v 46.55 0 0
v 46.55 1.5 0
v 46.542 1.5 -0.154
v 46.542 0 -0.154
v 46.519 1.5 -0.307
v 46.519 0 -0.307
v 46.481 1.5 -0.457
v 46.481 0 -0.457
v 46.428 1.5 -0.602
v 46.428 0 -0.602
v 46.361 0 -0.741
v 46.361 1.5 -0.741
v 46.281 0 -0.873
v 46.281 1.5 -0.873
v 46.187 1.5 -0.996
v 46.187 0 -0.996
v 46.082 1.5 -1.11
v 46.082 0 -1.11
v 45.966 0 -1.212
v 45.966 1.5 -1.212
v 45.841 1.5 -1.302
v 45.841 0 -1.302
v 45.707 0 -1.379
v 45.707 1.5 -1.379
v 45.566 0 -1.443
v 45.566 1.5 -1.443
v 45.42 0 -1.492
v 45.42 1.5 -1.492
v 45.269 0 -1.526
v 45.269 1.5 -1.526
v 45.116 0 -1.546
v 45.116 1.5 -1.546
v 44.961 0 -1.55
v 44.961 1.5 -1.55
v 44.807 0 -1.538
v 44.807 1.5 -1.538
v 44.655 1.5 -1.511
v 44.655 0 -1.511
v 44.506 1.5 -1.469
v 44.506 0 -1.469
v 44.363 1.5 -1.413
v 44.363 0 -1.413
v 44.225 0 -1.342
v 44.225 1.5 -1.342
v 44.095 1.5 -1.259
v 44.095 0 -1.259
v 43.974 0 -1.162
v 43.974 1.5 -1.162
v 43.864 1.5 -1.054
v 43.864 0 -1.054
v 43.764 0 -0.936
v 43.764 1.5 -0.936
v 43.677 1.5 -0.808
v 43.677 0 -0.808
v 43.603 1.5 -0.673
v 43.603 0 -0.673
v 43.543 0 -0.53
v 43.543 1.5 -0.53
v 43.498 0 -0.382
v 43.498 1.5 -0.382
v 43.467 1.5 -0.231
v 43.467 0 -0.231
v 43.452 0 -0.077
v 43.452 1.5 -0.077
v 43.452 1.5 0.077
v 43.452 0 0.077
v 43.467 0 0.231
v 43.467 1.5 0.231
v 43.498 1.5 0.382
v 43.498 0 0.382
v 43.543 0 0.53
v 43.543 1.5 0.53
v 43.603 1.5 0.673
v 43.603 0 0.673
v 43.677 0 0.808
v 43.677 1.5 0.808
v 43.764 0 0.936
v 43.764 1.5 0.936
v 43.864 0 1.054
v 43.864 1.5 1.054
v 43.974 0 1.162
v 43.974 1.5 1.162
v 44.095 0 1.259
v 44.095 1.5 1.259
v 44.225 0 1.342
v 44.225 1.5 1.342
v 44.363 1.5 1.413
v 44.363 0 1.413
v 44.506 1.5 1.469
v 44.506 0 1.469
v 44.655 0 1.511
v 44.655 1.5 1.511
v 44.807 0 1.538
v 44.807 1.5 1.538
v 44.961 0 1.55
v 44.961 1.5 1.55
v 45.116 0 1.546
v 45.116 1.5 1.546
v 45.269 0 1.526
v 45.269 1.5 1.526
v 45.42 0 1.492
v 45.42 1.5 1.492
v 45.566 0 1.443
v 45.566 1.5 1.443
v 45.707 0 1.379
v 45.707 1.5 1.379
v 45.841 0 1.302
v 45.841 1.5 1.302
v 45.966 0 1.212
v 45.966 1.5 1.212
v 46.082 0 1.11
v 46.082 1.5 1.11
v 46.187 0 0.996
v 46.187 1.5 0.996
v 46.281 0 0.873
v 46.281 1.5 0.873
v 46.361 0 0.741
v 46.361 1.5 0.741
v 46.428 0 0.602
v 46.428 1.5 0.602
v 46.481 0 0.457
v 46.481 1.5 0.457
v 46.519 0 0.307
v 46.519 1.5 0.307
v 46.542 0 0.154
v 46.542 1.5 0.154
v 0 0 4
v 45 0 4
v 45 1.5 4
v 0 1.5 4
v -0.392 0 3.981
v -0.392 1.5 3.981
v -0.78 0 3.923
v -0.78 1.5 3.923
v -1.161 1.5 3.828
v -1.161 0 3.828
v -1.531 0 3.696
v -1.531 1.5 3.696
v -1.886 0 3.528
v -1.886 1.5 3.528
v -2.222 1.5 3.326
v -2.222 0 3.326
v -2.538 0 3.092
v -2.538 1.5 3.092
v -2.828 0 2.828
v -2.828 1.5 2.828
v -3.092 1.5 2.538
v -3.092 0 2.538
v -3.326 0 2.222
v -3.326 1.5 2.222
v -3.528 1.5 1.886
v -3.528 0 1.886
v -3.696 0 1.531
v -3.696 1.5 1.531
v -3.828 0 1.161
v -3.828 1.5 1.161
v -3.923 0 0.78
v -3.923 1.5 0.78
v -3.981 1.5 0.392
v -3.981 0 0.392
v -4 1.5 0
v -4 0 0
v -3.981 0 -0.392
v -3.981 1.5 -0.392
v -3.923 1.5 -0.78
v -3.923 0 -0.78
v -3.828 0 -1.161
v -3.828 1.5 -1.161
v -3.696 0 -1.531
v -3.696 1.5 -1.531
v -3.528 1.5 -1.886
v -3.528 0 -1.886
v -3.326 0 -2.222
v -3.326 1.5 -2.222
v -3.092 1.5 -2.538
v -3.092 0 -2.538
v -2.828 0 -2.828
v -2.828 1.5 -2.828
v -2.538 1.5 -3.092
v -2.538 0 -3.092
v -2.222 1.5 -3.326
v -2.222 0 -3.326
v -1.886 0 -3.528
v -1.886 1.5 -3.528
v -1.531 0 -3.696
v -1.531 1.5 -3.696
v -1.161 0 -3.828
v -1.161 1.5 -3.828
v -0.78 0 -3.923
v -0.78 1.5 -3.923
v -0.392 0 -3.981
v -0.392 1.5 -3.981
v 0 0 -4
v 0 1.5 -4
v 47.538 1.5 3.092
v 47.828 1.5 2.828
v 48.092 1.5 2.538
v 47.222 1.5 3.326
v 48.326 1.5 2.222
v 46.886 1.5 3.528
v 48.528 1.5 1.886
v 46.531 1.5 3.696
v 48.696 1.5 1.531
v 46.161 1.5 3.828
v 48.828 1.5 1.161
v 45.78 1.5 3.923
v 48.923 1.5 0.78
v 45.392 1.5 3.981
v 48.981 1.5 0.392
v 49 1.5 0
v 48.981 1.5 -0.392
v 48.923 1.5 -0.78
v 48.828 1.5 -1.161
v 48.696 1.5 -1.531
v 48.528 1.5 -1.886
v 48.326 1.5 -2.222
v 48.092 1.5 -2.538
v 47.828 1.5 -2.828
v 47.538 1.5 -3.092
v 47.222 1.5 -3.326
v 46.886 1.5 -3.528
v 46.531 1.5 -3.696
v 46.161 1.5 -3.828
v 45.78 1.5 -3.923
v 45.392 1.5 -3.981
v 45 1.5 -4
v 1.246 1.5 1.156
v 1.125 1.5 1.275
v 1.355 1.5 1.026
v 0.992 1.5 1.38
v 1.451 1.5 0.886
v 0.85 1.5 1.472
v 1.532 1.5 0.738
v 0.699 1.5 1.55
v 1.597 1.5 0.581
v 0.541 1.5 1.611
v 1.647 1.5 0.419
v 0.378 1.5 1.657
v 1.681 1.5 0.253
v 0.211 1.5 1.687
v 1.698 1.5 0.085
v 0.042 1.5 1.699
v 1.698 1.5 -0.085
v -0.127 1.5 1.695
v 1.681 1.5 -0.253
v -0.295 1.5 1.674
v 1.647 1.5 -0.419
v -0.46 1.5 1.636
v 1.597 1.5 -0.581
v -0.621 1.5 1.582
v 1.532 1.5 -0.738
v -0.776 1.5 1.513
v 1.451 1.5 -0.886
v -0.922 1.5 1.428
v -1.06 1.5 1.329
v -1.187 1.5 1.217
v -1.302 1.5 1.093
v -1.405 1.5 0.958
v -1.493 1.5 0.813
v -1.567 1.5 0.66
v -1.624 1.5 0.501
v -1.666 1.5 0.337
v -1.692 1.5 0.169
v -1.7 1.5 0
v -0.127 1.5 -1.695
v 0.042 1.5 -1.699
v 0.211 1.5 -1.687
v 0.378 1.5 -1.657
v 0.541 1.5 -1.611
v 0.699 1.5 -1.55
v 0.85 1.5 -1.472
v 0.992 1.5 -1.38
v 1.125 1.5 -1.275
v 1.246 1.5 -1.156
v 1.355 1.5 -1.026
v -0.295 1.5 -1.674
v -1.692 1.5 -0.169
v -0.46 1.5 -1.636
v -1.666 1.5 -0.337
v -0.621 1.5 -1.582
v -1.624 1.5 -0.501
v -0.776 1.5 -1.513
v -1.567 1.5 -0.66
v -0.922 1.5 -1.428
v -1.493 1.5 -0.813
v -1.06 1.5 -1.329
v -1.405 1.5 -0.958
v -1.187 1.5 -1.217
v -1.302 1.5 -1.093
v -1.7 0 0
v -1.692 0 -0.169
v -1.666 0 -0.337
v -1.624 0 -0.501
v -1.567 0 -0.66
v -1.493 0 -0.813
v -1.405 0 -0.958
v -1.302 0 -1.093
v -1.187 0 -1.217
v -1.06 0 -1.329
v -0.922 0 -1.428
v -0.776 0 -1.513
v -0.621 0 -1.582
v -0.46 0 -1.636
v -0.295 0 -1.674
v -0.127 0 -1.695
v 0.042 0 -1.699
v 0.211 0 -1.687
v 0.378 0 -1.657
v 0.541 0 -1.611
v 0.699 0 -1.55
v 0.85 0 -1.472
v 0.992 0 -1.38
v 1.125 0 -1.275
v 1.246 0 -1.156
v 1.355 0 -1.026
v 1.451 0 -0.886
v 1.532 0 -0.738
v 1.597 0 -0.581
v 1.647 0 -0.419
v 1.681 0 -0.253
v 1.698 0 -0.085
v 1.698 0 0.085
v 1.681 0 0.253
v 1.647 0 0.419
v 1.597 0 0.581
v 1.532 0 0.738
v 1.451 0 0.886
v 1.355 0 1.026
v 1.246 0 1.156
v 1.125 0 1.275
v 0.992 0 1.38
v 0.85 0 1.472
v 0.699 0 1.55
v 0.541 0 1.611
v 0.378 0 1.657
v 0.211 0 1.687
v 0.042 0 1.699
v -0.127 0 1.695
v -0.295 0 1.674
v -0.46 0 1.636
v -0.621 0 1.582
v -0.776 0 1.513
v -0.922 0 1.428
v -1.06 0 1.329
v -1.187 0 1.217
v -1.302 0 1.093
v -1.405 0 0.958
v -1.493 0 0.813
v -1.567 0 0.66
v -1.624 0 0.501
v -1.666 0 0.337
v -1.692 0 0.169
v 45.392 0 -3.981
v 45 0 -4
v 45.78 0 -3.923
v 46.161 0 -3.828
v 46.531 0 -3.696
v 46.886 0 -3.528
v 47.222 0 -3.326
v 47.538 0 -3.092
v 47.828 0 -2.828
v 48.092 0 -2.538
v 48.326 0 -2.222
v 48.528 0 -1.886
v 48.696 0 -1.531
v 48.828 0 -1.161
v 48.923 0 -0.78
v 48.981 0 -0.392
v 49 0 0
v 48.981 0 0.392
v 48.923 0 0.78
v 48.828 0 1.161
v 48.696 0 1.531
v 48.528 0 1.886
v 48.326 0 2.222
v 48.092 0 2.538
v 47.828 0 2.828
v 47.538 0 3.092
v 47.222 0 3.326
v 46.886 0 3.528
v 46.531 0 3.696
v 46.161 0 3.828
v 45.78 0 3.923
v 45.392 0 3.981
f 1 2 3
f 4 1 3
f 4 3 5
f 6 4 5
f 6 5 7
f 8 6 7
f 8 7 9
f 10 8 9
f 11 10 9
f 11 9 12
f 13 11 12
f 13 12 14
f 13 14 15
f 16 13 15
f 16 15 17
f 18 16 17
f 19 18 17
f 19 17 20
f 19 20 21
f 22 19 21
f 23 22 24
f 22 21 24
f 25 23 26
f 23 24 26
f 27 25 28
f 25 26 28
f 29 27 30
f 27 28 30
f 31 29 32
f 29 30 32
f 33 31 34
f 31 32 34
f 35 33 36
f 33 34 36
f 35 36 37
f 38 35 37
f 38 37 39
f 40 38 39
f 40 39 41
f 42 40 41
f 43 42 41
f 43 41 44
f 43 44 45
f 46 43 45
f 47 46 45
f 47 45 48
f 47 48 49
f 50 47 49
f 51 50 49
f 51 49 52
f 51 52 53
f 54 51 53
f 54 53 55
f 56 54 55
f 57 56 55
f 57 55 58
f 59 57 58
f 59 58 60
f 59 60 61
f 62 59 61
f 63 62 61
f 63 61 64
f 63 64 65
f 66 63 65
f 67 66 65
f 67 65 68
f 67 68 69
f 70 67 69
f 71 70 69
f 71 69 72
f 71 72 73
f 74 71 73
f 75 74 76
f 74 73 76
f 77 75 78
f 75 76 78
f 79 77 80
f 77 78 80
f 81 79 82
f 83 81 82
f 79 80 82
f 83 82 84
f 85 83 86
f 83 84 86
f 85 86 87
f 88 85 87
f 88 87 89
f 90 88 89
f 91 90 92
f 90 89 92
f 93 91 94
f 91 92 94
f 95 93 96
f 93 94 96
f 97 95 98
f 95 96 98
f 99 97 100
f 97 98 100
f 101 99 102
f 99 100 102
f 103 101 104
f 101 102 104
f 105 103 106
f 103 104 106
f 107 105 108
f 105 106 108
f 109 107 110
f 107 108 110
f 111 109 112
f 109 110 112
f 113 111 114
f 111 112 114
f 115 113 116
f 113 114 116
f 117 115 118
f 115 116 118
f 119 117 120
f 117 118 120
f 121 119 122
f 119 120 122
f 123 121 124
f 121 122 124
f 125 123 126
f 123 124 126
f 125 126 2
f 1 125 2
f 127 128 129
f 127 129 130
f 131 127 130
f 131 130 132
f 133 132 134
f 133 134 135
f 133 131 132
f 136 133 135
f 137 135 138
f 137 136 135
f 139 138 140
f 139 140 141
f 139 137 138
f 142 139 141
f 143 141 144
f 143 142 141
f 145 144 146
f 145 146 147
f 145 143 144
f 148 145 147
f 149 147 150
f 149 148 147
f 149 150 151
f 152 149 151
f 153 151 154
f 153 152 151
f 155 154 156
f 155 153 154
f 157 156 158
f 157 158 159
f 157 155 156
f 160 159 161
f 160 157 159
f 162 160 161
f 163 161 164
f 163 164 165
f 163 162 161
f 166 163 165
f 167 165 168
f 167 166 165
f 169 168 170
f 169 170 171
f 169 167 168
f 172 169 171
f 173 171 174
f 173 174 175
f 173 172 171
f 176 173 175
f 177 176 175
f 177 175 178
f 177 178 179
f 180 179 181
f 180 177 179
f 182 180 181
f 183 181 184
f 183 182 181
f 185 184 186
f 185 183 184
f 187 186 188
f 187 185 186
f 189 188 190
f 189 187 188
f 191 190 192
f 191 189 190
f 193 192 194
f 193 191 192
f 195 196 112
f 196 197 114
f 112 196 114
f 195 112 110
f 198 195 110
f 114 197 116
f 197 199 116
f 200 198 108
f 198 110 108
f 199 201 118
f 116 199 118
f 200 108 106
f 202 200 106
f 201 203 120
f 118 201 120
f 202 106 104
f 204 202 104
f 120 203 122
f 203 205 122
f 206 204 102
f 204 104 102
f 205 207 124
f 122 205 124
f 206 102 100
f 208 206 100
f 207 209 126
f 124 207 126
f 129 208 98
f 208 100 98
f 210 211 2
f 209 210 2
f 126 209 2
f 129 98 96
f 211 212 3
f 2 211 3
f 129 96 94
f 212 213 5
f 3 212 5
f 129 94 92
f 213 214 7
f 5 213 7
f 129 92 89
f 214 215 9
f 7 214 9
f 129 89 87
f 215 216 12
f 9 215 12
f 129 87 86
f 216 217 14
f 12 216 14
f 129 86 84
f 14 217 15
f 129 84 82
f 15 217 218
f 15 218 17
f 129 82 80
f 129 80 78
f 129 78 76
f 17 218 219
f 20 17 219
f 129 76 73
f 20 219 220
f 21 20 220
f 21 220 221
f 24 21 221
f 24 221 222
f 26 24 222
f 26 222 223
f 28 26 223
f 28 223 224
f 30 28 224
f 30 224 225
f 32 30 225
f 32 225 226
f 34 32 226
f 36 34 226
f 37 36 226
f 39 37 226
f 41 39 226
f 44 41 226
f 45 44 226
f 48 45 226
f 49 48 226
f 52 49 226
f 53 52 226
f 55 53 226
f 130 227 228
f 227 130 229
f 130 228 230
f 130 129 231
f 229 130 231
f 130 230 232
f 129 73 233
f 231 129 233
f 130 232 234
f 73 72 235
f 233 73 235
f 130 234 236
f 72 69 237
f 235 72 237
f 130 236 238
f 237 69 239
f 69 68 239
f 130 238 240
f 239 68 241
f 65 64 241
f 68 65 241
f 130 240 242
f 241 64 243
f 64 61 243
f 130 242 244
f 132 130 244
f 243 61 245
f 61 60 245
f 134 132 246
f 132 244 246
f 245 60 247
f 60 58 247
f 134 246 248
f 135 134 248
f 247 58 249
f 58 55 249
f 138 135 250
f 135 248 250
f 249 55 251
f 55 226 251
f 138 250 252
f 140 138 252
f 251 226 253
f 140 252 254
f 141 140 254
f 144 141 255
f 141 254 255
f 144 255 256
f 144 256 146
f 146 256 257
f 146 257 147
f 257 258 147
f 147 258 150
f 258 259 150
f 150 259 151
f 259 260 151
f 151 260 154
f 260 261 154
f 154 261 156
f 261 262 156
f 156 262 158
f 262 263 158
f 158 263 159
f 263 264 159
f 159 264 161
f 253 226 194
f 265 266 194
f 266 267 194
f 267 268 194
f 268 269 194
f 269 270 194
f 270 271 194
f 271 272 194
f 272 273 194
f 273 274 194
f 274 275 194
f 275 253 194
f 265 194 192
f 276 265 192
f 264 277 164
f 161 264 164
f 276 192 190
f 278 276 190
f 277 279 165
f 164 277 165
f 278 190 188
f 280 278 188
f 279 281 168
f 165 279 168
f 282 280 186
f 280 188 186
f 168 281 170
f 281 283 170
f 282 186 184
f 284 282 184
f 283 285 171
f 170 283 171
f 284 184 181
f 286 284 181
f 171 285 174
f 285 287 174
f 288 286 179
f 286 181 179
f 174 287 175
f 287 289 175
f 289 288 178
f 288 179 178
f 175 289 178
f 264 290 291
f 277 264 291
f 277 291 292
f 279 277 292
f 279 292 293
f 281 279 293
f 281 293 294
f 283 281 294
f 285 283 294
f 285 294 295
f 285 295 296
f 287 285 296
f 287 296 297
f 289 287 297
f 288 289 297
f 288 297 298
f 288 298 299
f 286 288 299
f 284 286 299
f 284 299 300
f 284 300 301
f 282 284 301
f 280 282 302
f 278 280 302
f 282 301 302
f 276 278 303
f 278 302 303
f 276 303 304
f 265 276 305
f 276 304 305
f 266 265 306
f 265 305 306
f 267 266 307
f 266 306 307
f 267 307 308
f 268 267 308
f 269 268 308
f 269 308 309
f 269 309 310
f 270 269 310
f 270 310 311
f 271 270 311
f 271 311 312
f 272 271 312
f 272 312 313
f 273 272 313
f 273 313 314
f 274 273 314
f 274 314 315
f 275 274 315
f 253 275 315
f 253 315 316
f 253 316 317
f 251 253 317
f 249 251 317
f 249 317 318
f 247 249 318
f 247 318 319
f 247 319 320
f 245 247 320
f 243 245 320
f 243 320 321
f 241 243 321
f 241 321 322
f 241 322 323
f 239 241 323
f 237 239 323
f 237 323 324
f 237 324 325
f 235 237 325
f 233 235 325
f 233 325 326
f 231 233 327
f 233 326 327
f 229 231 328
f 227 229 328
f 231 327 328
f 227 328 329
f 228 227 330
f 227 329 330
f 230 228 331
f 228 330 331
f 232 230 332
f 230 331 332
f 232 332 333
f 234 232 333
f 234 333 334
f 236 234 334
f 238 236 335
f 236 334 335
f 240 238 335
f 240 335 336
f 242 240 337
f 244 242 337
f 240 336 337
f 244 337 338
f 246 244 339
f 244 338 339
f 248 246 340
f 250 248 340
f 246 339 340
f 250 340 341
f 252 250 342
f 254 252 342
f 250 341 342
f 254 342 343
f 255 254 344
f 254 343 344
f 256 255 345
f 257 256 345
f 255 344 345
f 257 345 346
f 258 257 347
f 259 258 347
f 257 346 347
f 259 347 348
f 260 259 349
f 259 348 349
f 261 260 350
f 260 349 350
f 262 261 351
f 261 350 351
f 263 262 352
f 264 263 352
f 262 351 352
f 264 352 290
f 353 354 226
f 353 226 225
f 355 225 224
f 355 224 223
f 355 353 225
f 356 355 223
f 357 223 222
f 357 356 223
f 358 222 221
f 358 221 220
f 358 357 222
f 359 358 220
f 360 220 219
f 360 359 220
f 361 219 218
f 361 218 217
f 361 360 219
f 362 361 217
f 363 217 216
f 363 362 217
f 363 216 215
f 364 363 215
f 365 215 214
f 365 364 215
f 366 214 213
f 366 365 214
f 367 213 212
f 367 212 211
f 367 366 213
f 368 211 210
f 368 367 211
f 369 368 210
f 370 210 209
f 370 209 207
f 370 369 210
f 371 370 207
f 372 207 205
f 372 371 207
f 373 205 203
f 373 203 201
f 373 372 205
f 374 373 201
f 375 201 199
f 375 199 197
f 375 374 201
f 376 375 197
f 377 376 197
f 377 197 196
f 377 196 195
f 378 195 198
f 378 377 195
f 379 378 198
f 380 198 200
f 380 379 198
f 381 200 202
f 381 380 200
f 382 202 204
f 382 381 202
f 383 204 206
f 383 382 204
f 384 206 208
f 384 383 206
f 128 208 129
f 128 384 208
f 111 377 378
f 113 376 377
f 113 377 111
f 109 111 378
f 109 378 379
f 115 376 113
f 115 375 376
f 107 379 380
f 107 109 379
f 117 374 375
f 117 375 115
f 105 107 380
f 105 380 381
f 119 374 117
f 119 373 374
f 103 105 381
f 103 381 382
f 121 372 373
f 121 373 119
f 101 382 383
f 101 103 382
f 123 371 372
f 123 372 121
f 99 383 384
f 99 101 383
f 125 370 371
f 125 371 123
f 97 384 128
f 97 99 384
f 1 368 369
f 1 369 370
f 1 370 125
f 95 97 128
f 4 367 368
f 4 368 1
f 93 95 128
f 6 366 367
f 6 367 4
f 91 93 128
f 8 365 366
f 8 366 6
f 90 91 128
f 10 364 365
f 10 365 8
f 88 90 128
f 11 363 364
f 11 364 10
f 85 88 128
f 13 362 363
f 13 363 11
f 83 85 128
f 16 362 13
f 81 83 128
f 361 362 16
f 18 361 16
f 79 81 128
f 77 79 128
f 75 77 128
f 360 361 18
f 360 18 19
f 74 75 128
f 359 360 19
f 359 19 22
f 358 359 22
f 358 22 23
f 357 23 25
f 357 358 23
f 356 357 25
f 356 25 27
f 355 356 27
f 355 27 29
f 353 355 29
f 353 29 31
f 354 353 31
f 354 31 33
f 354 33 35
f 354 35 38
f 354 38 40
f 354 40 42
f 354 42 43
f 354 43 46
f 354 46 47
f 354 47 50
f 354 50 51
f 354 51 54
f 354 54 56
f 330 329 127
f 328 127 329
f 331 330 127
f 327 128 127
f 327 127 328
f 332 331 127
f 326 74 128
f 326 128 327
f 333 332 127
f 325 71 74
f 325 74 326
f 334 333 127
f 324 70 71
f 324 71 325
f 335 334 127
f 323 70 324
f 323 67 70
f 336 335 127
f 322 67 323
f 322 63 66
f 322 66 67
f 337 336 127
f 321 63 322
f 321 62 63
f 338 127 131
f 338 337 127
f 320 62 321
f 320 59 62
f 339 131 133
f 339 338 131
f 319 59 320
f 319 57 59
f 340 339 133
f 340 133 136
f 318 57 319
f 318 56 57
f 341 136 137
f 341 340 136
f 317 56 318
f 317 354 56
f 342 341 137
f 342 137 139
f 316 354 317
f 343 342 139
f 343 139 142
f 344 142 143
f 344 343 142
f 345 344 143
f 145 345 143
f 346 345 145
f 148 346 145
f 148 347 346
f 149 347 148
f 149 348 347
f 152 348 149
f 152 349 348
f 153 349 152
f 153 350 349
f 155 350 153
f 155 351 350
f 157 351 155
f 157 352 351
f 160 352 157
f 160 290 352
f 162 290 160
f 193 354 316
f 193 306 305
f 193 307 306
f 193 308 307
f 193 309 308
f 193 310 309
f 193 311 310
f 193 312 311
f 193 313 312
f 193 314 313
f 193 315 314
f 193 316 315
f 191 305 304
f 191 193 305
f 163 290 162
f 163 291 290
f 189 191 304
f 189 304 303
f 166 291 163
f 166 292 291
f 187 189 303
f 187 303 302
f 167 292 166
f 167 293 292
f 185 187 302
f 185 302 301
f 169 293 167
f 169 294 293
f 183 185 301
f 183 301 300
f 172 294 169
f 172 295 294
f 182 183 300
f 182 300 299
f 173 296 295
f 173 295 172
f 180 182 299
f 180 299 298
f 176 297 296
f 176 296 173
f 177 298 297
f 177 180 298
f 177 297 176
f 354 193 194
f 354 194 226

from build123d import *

# Parameters (mm, degrees)
BOSS_EXTRUDE1_DEPTH  = 1.5
M3_CLEARANCE_HOLE1_D = 3.4
SKETCH4_R            = 1.55
CUT_EXTRUDE1_DEPTH   = 2.5


with BuildPart() as part:
    # Sketch1 → Boss-Extrude1 (new body)
    with BuildSketch(Plane(origin=(0, 0, 0), x_dir=(1, 0, 0), z_dir=(0, 1, 0))):
        with BuildLine():
            Line((0, 4), (45, 4))
            ThreePointArc((45, 4), (49, 0), (45, -4))
            Line((45, -4), (0, -4))
            ThreePointArc((0, -4), (-4, 0), (0, 4))
        make_face()
    extrude(amount=BOSS_EXTRUDE1_DEPTH)

    # M3 Clearance Hole1 (through all)
    with Locations(Plane(origin=(0, 1.5, 0), x_dir=(1, 0, 0), z_dir=(0, 1, 0))):
        with Locations((0, 0)):
            Hole(M3_CLEARANCE_HOLE1_D / 2)

    # Sketch4 → Cut-Extrude1 (cut, through all)
    with BuildSketch(Plane(origin=(0, 1.5, 0), x_dir=(1, 0, 0), z_dir=(0, 1, 0))):
        with Locations((45, 0)):
            Circle(SKETCH4_R)
    extrude(amount=-CUT_EXTRUDE1_DEPTH, mode=Mode.SUBTRACT)


solid = part.part
